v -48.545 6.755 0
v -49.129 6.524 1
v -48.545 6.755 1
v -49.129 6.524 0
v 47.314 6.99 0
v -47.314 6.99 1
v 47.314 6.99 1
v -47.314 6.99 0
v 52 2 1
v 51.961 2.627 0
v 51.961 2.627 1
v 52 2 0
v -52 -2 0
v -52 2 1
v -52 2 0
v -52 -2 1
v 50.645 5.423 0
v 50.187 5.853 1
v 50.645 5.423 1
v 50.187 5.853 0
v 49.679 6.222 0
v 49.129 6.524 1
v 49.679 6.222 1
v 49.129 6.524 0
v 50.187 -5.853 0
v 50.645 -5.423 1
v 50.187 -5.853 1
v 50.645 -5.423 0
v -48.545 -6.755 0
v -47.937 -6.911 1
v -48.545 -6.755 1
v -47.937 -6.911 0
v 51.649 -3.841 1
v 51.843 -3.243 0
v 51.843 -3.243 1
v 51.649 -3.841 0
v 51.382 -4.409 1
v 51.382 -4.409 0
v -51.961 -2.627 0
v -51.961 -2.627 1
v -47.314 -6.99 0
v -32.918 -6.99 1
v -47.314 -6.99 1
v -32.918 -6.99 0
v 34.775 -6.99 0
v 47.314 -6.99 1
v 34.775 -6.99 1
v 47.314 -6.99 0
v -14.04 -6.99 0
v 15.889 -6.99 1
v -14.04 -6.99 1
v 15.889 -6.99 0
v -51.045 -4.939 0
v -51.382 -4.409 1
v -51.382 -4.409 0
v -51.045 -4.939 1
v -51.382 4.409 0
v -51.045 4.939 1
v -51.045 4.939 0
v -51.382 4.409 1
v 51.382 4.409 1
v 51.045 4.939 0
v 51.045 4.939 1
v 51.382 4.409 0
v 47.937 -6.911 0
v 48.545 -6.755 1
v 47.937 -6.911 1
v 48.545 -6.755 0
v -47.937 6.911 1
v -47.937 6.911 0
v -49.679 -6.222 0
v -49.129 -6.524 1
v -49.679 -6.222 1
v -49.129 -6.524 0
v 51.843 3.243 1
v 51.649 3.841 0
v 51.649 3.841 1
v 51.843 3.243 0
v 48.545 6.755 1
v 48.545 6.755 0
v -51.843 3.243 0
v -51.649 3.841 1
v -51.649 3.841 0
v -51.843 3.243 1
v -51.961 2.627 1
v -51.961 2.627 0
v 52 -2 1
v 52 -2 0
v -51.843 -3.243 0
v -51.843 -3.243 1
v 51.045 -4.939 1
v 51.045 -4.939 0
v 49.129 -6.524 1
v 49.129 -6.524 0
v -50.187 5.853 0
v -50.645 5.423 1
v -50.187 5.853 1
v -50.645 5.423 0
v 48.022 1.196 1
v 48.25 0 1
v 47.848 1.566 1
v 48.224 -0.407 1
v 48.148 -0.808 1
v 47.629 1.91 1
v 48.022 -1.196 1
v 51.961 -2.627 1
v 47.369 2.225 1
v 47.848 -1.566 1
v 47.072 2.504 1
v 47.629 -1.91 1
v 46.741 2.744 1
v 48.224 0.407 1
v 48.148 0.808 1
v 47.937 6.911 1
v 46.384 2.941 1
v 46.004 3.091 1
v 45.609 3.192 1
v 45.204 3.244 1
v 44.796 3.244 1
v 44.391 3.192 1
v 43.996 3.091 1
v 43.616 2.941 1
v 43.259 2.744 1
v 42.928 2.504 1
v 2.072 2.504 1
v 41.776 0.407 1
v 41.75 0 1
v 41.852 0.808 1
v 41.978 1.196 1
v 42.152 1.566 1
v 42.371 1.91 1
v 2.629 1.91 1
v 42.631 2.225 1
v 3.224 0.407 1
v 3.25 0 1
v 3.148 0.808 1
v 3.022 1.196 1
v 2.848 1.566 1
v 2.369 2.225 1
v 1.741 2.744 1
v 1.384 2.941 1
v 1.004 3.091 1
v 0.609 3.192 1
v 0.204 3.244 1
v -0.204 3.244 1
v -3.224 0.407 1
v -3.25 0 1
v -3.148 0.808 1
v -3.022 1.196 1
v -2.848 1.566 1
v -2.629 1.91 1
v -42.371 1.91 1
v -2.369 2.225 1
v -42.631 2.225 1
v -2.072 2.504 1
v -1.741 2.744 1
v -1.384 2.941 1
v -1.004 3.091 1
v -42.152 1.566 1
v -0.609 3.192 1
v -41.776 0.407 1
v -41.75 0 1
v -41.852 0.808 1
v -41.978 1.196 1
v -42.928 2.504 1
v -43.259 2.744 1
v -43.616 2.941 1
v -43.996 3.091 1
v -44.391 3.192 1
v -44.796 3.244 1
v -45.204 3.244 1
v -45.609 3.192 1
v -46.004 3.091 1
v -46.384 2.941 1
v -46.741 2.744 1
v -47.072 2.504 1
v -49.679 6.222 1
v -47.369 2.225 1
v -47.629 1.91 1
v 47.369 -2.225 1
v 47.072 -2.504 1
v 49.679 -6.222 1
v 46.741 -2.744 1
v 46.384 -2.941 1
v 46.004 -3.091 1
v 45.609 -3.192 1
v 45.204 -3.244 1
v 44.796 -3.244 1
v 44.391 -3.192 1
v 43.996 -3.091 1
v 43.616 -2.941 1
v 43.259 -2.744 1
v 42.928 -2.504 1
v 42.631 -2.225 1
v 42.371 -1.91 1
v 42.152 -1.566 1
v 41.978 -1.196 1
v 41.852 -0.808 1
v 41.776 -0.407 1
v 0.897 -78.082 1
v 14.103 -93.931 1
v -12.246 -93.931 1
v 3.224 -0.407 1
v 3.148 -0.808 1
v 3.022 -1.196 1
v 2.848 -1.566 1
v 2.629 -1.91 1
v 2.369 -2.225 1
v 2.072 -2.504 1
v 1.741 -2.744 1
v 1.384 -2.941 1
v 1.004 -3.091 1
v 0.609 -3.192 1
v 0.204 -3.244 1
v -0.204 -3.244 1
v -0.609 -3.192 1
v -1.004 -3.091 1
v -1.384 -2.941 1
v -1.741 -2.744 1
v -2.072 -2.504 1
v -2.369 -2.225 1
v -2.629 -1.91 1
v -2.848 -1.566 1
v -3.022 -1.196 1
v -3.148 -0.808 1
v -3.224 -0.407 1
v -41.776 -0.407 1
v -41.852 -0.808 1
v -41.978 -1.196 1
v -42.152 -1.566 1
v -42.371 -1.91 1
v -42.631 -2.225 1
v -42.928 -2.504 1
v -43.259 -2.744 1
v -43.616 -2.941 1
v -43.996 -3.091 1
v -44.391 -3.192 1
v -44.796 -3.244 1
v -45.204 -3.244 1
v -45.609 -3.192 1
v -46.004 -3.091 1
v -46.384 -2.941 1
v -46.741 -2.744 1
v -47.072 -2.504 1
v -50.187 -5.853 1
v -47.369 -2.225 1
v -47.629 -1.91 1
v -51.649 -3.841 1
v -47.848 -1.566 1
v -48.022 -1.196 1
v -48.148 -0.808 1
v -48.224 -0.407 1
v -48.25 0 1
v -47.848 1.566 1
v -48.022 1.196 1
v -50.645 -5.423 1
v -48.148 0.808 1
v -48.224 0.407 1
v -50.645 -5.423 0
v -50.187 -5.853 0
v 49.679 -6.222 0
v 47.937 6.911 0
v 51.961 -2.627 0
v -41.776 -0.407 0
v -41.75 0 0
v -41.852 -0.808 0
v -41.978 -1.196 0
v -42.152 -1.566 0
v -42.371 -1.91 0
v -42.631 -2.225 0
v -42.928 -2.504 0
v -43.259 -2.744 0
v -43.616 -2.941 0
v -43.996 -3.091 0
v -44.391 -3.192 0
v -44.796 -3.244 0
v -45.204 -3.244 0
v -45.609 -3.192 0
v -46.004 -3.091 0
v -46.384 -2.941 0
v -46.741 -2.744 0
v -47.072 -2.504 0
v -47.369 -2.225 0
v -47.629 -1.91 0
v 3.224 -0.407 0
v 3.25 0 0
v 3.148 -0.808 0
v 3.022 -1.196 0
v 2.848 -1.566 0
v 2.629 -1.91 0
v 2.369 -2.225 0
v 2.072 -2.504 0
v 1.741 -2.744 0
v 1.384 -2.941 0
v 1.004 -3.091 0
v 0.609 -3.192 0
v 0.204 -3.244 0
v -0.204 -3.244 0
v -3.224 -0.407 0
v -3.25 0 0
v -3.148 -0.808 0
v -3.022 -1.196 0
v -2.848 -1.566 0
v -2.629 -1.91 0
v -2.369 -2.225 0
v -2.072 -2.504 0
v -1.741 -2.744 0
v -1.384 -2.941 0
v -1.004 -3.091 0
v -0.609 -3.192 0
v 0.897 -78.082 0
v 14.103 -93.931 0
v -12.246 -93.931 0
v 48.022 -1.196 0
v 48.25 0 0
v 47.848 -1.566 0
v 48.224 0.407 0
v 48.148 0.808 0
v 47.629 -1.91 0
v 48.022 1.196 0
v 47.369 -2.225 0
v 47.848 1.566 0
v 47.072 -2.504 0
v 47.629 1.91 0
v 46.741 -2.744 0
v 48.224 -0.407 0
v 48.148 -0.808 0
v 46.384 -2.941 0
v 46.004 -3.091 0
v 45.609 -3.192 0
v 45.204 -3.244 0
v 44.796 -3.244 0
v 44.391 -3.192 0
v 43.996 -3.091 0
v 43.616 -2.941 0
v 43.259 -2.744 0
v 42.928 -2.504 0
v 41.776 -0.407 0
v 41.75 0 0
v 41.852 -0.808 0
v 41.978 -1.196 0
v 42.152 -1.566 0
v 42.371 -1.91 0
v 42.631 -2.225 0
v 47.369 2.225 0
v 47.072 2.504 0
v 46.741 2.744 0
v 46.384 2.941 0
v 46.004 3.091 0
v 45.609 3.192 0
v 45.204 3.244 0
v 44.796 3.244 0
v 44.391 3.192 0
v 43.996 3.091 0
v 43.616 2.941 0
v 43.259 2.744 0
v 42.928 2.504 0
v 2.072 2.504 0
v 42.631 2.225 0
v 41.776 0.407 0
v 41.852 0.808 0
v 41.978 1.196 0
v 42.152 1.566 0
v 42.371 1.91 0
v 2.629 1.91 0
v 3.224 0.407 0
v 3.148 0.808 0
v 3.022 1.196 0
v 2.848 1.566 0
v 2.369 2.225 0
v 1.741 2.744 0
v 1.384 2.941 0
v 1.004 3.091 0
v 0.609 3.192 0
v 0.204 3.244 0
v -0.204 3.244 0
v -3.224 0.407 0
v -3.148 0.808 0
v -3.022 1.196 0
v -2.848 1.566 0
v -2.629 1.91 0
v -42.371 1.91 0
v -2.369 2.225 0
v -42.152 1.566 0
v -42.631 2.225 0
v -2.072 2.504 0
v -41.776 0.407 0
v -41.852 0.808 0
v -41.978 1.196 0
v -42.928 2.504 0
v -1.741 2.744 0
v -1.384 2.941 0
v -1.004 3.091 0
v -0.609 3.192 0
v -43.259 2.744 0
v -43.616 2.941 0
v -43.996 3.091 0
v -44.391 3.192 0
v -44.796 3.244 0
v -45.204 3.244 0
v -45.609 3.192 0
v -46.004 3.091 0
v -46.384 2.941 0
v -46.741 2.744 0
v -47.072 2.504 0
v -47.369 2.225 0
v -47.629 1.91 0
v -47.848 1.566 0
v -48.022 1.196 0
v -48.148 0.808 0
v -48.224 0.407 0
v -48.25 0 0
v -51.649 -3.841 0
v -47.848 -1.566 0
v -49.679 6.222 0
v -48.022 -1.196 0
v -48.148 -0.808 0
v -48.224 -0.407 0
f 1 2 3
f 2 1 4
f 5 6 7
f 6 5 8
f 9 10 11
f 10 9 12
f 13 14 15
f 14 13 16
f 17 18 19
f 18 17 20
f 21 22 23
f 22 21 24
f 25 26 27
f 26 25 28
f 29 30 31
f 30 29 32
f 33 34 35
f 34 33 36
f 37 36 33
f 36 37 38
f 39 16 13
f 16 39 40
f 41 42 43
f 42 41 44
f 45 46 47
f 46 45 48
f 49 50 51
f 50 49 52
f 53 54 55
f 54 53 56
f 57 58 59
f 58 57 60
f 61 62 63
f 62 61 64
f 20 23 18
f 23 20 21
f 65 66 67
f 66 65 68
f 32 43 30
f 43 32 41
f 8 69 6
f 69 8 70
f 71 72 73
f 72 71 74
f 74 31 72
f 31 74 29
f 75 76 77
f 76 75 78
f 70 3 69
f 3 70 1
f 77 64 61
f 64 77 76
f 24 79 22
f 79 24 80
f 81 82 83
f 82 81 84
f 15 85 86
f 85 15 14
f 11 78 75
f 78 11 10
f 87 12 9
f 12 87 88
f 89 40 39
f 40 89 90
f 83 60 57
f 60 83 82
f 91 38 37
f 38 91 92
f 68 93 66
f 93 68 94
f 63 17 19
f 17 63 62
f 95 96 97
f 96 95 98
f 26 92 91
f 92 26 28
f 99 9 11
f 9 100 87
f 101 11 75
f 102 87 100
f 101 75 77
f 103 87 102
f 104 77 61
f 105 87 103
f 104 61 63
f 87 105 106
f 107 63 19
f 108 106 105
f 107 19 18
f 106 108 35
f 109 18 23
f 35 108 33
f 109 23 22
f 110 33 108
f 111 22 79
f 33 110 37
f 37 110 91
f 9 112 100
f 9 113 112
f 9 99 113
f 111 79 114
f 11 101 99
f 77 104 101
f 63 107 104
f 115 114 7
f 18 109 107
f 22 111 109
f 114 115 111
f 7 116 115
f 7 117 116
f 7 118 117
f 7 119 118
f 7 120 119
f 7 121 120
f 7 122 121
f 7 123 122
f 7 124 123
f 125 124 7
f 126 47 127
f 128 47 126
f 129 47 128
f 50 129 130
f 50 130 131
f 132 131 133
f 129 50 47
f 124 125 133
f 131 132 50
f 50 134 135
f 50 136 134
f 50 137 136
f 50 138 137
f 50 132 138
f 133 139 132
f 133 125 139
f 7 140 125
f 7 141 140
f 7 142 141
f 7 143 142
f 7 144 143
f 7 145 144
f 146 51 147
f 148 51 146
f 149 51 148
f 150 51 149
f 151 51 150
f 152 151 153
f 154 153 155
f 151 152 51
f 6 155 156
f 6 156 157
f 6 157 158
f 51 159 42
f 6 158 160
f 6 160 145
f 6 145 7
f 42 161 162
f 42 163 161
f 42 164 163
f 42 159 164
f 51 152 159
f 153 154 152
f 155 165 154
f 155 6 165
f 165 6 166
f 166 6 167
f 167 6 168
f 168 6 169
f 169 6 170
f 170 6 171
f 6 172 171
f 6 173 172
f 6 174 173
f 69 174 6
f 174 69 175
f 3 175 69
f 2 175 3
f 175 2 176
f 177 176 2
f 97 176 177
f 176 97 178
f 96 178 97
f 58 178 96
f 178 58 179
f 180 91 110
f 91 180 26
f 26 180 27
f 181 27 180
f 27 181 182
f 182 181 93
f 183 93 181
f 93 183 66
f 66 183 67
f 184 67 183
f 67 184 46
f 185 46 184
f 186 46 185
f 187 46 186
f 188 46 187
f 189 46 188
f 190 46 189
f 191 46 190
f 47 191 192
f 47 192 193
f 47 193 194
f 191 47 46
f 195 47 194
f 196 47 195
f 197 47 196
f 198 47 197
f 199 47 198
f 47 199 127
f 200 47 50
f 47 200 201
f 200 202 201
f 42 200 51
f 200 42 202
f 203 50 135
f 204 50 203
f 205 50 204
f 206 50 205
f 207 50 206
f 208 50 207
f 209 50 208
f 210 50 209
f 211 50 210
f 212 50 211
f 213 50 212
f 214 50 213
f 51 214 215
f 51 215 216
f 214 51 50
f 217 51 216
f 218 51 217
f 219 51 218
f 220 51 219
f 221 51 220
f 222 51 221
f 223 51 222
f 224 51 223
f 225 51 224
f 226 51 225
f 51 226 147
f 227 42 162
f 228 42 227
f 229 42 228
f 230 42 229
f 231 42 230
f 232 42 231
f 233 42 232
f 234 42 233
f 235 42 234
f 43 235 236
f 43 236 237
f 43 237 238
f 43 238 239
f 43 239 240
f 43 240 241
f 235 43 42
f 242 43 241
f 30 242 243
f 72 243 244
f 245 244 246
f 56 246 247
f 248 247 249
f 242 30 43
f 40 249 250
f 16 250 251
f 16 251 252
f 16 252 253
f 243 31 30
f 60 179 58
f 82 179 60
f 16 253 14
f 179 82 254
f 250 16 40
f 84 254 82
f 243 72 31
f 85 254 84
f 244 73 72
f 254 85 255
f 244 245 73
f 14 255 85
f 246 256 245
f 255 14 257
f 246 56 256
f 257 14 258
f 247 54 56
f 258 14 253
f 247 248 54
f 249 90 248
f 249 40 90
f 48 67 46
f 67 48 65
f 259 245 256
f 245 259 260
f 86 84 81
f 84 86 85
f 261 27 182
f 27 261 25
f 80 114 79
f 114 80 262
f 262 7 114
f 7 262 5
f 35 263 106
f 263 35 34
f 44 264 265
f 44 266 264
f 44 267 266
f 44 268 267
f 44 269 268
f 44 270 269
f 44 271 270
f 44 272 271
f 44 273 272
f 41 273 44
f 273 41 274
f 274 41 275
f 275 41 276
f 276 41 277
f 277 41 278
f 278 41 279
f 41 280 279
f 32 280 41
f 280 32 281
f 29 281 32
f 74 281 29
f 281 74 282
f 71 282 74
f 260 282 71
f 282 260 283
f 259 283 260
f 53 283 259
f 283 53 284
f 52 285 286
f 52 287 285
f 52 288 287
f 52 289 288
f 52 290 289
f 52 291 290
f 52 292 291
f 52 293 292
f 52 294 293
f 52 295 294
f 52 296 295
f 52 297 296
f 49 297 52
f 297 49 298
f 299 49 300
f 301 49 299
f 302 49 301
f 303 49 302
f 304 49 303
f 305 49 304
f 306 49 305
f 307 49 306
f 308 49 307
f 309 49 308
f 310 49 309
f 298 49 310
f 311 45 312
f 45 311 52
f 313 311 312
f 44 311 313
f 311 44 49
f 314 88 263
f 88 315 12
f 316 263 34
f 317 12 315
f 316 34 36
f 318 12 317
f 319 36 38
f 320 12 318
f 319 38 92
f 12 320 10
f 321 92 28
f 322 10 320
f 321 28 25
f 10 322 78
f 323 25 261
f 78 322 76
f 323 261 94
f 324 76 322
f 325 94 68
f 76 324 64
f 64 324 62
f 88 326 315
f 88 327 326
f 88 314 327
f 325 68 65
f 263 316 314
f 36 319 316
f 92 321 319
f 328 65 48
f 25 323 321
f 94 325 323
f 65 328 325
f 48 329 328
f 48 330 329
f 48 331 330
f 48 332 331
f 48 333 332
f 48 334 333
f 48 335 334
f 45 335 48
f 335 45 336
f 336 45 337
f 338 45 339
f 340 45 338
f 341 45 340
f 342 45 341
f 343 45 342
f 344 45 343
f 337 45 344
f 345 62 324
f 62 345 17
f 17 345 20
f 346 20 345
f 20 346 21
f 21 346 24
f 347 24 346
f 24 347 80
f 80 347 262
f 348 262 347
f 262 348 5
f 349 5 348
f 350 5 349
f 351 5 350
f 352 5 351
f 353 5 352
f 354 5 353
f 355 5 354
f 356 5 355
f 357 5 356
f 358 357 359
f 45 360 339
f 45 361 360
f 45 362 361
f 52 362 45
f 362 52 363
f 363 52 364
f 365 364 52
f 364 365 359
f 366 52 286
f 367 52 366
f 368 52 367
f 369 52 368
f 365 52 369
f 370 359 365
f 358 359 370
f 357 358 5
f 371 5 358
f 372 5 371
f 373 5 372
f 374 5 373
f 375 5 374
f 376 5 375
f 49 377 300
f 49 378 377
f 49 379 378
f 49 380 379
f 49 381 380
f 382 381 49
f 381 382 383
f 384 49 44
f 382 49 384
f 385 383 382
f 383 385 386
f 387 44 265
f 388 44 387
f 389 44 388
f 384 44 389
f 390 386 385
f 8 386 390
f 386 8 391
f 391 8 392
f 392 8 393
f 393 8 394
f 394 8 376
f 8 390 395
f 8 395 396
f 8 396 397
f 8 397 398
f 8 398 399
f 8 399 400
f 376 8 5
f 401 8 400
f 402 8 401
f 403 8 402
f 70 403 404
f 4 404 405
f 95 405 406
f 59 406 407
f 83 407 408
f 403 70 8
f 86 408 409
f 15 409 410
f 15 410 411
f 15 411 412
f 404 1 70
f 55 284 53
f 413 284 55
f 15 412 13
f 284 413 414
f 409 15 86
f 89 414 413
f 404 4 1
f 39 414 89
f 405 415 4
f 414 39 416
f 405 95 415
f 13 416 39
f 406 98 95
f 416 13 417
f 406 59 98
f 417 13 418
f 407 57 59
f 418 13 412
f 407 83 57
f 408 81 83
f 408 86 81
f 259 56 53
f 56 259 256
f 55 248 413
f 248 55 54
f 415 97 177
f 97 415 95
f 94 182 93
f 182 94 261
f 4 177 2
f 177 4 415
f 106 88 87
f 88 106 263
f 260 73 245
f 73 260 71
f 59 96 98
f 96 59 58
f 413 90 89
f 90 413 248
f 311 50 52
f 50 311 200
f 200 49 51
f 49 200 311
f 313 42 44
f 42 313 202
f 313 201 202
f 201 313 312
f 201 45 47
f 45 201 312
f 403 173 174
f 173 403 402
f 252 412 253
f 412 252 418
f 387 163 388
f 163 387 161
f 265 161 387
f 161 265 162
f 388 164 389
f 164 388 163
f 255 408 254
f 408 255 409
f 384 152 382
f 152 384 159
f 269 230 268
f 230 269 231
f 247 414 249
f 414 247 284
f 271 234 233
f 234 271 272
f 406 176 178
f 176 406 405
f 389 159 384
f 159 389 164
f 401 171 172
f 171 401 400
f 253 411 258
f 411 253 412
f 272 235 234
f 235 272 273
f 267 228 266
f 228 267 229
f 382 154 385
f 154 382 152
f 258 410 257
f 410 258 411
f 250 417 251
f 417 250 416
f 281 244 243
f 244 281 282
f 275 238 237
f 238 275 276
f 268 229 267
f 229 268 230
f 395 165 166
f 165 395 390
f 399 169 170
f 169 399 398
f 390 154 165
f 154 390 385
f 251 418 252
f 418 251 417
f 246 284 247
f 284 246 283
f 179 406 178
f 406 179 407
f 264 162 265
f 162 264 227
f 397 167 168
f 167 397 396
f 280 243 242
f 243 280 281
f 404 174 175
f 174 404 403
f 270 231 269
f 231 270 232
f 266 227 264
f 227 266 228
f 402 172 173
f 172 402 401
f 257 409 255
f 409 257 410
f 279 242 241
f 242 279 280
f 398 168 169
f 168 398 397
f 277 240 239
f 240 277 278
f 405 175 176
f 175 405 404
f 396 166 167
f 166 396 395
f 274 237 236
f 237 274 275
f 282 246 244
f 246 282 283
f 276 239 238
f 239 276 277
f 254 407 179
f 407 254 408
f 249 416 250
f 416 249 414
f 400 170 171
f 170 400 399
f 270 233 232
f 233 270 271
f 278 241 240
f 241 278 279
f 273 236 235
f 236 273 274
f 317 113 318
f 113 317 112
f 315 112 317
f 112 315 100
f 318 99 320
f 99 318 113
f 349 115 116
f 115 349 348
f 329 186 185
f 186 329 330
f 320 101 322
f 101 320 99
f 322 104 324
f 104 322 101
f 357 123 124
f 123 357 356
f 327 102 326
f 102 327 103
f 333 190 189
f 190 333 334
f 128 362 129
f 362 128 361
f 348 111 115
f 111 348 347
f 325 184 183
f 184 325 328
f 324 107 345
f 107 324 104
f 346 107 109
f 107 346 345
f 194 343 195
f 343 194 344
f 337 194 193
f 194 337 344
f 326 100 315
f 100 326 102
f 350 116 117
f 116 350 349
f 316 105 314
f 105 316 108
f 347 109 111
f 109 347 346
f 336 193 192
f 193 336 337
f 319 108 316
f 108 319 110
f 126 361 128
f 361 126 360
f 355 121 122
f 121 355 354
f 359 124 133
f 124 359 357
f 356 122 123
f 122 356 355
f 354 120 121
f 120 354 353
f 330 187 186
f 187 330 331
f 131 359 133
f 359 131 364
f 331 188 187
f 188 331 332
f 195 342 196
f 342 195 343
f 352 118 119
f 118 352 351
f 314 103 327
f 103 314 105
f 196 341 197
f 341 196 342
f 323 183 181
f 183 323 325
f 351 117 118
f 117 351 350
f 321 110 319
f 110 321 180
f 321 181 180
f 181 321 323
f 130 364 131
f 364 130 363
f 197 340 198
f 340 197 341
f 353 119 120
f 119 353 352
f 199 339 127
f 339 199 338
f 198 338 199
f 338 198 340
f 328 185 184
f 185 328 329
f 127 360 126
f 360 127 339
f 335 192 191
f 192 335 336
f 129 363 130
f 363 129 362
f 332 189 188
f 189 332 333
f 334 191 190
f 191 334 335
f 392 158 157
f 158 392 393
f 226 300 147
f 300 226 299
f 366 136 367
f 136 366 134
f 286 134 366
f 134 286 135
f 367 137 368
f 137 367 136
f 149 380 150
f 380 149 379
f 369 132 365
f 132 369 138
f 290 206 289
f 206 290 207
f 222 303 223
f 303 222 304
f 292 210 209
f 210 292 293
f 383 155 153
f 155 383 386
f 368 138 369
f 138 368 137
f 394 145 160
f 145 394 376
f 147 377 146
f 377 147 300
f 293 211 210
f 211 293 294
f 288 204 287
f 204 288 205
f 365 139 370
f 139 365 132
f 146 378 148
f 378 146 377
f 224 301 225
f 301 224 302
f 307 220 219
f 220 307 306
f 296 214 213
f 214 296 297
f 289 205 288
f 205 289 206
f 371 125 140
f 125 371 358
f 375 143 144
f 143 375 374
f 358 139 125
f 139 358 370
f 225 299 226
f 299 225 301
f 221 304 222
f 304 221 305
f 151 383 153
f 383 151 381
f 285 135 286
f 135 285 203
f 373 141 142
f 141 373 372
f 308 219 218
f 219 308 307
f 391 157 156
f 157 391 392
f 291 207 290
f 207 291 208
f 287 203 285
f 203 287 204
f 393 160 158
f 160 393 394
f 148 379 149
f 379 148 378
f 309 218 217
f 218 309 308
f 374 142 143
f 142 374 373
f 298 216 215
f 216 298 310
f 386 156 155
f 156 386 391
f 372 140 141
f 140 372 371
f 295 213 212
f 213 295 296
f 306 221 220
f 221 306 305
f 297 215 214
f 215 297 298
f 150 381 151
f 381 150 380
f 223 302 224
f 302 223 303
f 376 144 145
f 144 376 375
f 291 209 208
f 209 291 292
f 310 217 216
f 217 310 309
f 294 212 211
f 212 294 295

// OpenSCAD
$fn = 50;


difference() {
	union() {
		translate(v = [0, 0, 0]) {
			rotate(a = [0, 0, 0]) {
				hull() {
					translate(v = [-47.0000000000, 2.0000000000, 0]) {
						rotate(a = [0, 0, 0]) {
							translate(v = [0, 0, 0]) {
								rotate(a = [0, 0, 0]) {
									cylinder(h = 1, r = 5);
								}
							}
						}
					}
					translate(v = [47.0000000000, 2.0000000000, 0]) {
						rotate(a = [0, 0, 0]) {
							translate(v = [0, 0, 0]) {
								rotate(a = [0, 0, 0]) {
									cylinder(h = 1, r = 5);
								}
							}
						}
					}
					translate(v = [-47.0000000000, -2.0000000000, 0]) {
						rotate(a = [0, 0, 0]) {
							translate(v = [0, 0, 0]) {
								rotate(a = [0, 0, 0]) {
									cylinder(h = 1, r = 5);
								}
							}
						}
					}
					translate(v = [47.0000000000, -2.0000000000, 0]) {
						rotate(a = [0, 0, 0]) {
							translate(v = [0, 0, 0]) {
								rotate(a = [0, 0, 0]) {
									cylinder(h = 1, r = 5);
								}
							}
						}
					}
				}
			}
		}
		translate(v = [0, 0, 0]) {
			rotate(a = [0, 0, 0]) {
				linear_extrude(height = 1) {
					text(font = "DejaVu Sans Mono:style=Bold", halign = "center", size = 95.0000000000, text = "V", valign = "top");
				}
			}
		}
	}
	union() {
		translate(v = [-45.0000000000, 0.0000000000, -125.0000000000]) {
			rotate(a = [0, 0, 0]) {
				cylinder(h = 250, r = 3.2500000000);
			}
		}
		translate(v = [45.0000000000, 0.0000000000, -125.0000000000]) {
			rotate(a = [0, 0, 0]) {
				cylinder(h = 250, r = 3.2500000000);
			}
		}
		translate(v = [45.0000000000, 0.0000000000, -125.0000000000]) {
			rotate(a = [0, 0, 0]) {
				cylinder(h = 250, r = 3.2500000000);
			}
		}
		translate(v = [0, 0, -125.0000000000]) {
			rotate(a = [0, 0, 0]) {
				cylinder(h = 250, r = 3.2500000000);
			}
		}
	}
}
